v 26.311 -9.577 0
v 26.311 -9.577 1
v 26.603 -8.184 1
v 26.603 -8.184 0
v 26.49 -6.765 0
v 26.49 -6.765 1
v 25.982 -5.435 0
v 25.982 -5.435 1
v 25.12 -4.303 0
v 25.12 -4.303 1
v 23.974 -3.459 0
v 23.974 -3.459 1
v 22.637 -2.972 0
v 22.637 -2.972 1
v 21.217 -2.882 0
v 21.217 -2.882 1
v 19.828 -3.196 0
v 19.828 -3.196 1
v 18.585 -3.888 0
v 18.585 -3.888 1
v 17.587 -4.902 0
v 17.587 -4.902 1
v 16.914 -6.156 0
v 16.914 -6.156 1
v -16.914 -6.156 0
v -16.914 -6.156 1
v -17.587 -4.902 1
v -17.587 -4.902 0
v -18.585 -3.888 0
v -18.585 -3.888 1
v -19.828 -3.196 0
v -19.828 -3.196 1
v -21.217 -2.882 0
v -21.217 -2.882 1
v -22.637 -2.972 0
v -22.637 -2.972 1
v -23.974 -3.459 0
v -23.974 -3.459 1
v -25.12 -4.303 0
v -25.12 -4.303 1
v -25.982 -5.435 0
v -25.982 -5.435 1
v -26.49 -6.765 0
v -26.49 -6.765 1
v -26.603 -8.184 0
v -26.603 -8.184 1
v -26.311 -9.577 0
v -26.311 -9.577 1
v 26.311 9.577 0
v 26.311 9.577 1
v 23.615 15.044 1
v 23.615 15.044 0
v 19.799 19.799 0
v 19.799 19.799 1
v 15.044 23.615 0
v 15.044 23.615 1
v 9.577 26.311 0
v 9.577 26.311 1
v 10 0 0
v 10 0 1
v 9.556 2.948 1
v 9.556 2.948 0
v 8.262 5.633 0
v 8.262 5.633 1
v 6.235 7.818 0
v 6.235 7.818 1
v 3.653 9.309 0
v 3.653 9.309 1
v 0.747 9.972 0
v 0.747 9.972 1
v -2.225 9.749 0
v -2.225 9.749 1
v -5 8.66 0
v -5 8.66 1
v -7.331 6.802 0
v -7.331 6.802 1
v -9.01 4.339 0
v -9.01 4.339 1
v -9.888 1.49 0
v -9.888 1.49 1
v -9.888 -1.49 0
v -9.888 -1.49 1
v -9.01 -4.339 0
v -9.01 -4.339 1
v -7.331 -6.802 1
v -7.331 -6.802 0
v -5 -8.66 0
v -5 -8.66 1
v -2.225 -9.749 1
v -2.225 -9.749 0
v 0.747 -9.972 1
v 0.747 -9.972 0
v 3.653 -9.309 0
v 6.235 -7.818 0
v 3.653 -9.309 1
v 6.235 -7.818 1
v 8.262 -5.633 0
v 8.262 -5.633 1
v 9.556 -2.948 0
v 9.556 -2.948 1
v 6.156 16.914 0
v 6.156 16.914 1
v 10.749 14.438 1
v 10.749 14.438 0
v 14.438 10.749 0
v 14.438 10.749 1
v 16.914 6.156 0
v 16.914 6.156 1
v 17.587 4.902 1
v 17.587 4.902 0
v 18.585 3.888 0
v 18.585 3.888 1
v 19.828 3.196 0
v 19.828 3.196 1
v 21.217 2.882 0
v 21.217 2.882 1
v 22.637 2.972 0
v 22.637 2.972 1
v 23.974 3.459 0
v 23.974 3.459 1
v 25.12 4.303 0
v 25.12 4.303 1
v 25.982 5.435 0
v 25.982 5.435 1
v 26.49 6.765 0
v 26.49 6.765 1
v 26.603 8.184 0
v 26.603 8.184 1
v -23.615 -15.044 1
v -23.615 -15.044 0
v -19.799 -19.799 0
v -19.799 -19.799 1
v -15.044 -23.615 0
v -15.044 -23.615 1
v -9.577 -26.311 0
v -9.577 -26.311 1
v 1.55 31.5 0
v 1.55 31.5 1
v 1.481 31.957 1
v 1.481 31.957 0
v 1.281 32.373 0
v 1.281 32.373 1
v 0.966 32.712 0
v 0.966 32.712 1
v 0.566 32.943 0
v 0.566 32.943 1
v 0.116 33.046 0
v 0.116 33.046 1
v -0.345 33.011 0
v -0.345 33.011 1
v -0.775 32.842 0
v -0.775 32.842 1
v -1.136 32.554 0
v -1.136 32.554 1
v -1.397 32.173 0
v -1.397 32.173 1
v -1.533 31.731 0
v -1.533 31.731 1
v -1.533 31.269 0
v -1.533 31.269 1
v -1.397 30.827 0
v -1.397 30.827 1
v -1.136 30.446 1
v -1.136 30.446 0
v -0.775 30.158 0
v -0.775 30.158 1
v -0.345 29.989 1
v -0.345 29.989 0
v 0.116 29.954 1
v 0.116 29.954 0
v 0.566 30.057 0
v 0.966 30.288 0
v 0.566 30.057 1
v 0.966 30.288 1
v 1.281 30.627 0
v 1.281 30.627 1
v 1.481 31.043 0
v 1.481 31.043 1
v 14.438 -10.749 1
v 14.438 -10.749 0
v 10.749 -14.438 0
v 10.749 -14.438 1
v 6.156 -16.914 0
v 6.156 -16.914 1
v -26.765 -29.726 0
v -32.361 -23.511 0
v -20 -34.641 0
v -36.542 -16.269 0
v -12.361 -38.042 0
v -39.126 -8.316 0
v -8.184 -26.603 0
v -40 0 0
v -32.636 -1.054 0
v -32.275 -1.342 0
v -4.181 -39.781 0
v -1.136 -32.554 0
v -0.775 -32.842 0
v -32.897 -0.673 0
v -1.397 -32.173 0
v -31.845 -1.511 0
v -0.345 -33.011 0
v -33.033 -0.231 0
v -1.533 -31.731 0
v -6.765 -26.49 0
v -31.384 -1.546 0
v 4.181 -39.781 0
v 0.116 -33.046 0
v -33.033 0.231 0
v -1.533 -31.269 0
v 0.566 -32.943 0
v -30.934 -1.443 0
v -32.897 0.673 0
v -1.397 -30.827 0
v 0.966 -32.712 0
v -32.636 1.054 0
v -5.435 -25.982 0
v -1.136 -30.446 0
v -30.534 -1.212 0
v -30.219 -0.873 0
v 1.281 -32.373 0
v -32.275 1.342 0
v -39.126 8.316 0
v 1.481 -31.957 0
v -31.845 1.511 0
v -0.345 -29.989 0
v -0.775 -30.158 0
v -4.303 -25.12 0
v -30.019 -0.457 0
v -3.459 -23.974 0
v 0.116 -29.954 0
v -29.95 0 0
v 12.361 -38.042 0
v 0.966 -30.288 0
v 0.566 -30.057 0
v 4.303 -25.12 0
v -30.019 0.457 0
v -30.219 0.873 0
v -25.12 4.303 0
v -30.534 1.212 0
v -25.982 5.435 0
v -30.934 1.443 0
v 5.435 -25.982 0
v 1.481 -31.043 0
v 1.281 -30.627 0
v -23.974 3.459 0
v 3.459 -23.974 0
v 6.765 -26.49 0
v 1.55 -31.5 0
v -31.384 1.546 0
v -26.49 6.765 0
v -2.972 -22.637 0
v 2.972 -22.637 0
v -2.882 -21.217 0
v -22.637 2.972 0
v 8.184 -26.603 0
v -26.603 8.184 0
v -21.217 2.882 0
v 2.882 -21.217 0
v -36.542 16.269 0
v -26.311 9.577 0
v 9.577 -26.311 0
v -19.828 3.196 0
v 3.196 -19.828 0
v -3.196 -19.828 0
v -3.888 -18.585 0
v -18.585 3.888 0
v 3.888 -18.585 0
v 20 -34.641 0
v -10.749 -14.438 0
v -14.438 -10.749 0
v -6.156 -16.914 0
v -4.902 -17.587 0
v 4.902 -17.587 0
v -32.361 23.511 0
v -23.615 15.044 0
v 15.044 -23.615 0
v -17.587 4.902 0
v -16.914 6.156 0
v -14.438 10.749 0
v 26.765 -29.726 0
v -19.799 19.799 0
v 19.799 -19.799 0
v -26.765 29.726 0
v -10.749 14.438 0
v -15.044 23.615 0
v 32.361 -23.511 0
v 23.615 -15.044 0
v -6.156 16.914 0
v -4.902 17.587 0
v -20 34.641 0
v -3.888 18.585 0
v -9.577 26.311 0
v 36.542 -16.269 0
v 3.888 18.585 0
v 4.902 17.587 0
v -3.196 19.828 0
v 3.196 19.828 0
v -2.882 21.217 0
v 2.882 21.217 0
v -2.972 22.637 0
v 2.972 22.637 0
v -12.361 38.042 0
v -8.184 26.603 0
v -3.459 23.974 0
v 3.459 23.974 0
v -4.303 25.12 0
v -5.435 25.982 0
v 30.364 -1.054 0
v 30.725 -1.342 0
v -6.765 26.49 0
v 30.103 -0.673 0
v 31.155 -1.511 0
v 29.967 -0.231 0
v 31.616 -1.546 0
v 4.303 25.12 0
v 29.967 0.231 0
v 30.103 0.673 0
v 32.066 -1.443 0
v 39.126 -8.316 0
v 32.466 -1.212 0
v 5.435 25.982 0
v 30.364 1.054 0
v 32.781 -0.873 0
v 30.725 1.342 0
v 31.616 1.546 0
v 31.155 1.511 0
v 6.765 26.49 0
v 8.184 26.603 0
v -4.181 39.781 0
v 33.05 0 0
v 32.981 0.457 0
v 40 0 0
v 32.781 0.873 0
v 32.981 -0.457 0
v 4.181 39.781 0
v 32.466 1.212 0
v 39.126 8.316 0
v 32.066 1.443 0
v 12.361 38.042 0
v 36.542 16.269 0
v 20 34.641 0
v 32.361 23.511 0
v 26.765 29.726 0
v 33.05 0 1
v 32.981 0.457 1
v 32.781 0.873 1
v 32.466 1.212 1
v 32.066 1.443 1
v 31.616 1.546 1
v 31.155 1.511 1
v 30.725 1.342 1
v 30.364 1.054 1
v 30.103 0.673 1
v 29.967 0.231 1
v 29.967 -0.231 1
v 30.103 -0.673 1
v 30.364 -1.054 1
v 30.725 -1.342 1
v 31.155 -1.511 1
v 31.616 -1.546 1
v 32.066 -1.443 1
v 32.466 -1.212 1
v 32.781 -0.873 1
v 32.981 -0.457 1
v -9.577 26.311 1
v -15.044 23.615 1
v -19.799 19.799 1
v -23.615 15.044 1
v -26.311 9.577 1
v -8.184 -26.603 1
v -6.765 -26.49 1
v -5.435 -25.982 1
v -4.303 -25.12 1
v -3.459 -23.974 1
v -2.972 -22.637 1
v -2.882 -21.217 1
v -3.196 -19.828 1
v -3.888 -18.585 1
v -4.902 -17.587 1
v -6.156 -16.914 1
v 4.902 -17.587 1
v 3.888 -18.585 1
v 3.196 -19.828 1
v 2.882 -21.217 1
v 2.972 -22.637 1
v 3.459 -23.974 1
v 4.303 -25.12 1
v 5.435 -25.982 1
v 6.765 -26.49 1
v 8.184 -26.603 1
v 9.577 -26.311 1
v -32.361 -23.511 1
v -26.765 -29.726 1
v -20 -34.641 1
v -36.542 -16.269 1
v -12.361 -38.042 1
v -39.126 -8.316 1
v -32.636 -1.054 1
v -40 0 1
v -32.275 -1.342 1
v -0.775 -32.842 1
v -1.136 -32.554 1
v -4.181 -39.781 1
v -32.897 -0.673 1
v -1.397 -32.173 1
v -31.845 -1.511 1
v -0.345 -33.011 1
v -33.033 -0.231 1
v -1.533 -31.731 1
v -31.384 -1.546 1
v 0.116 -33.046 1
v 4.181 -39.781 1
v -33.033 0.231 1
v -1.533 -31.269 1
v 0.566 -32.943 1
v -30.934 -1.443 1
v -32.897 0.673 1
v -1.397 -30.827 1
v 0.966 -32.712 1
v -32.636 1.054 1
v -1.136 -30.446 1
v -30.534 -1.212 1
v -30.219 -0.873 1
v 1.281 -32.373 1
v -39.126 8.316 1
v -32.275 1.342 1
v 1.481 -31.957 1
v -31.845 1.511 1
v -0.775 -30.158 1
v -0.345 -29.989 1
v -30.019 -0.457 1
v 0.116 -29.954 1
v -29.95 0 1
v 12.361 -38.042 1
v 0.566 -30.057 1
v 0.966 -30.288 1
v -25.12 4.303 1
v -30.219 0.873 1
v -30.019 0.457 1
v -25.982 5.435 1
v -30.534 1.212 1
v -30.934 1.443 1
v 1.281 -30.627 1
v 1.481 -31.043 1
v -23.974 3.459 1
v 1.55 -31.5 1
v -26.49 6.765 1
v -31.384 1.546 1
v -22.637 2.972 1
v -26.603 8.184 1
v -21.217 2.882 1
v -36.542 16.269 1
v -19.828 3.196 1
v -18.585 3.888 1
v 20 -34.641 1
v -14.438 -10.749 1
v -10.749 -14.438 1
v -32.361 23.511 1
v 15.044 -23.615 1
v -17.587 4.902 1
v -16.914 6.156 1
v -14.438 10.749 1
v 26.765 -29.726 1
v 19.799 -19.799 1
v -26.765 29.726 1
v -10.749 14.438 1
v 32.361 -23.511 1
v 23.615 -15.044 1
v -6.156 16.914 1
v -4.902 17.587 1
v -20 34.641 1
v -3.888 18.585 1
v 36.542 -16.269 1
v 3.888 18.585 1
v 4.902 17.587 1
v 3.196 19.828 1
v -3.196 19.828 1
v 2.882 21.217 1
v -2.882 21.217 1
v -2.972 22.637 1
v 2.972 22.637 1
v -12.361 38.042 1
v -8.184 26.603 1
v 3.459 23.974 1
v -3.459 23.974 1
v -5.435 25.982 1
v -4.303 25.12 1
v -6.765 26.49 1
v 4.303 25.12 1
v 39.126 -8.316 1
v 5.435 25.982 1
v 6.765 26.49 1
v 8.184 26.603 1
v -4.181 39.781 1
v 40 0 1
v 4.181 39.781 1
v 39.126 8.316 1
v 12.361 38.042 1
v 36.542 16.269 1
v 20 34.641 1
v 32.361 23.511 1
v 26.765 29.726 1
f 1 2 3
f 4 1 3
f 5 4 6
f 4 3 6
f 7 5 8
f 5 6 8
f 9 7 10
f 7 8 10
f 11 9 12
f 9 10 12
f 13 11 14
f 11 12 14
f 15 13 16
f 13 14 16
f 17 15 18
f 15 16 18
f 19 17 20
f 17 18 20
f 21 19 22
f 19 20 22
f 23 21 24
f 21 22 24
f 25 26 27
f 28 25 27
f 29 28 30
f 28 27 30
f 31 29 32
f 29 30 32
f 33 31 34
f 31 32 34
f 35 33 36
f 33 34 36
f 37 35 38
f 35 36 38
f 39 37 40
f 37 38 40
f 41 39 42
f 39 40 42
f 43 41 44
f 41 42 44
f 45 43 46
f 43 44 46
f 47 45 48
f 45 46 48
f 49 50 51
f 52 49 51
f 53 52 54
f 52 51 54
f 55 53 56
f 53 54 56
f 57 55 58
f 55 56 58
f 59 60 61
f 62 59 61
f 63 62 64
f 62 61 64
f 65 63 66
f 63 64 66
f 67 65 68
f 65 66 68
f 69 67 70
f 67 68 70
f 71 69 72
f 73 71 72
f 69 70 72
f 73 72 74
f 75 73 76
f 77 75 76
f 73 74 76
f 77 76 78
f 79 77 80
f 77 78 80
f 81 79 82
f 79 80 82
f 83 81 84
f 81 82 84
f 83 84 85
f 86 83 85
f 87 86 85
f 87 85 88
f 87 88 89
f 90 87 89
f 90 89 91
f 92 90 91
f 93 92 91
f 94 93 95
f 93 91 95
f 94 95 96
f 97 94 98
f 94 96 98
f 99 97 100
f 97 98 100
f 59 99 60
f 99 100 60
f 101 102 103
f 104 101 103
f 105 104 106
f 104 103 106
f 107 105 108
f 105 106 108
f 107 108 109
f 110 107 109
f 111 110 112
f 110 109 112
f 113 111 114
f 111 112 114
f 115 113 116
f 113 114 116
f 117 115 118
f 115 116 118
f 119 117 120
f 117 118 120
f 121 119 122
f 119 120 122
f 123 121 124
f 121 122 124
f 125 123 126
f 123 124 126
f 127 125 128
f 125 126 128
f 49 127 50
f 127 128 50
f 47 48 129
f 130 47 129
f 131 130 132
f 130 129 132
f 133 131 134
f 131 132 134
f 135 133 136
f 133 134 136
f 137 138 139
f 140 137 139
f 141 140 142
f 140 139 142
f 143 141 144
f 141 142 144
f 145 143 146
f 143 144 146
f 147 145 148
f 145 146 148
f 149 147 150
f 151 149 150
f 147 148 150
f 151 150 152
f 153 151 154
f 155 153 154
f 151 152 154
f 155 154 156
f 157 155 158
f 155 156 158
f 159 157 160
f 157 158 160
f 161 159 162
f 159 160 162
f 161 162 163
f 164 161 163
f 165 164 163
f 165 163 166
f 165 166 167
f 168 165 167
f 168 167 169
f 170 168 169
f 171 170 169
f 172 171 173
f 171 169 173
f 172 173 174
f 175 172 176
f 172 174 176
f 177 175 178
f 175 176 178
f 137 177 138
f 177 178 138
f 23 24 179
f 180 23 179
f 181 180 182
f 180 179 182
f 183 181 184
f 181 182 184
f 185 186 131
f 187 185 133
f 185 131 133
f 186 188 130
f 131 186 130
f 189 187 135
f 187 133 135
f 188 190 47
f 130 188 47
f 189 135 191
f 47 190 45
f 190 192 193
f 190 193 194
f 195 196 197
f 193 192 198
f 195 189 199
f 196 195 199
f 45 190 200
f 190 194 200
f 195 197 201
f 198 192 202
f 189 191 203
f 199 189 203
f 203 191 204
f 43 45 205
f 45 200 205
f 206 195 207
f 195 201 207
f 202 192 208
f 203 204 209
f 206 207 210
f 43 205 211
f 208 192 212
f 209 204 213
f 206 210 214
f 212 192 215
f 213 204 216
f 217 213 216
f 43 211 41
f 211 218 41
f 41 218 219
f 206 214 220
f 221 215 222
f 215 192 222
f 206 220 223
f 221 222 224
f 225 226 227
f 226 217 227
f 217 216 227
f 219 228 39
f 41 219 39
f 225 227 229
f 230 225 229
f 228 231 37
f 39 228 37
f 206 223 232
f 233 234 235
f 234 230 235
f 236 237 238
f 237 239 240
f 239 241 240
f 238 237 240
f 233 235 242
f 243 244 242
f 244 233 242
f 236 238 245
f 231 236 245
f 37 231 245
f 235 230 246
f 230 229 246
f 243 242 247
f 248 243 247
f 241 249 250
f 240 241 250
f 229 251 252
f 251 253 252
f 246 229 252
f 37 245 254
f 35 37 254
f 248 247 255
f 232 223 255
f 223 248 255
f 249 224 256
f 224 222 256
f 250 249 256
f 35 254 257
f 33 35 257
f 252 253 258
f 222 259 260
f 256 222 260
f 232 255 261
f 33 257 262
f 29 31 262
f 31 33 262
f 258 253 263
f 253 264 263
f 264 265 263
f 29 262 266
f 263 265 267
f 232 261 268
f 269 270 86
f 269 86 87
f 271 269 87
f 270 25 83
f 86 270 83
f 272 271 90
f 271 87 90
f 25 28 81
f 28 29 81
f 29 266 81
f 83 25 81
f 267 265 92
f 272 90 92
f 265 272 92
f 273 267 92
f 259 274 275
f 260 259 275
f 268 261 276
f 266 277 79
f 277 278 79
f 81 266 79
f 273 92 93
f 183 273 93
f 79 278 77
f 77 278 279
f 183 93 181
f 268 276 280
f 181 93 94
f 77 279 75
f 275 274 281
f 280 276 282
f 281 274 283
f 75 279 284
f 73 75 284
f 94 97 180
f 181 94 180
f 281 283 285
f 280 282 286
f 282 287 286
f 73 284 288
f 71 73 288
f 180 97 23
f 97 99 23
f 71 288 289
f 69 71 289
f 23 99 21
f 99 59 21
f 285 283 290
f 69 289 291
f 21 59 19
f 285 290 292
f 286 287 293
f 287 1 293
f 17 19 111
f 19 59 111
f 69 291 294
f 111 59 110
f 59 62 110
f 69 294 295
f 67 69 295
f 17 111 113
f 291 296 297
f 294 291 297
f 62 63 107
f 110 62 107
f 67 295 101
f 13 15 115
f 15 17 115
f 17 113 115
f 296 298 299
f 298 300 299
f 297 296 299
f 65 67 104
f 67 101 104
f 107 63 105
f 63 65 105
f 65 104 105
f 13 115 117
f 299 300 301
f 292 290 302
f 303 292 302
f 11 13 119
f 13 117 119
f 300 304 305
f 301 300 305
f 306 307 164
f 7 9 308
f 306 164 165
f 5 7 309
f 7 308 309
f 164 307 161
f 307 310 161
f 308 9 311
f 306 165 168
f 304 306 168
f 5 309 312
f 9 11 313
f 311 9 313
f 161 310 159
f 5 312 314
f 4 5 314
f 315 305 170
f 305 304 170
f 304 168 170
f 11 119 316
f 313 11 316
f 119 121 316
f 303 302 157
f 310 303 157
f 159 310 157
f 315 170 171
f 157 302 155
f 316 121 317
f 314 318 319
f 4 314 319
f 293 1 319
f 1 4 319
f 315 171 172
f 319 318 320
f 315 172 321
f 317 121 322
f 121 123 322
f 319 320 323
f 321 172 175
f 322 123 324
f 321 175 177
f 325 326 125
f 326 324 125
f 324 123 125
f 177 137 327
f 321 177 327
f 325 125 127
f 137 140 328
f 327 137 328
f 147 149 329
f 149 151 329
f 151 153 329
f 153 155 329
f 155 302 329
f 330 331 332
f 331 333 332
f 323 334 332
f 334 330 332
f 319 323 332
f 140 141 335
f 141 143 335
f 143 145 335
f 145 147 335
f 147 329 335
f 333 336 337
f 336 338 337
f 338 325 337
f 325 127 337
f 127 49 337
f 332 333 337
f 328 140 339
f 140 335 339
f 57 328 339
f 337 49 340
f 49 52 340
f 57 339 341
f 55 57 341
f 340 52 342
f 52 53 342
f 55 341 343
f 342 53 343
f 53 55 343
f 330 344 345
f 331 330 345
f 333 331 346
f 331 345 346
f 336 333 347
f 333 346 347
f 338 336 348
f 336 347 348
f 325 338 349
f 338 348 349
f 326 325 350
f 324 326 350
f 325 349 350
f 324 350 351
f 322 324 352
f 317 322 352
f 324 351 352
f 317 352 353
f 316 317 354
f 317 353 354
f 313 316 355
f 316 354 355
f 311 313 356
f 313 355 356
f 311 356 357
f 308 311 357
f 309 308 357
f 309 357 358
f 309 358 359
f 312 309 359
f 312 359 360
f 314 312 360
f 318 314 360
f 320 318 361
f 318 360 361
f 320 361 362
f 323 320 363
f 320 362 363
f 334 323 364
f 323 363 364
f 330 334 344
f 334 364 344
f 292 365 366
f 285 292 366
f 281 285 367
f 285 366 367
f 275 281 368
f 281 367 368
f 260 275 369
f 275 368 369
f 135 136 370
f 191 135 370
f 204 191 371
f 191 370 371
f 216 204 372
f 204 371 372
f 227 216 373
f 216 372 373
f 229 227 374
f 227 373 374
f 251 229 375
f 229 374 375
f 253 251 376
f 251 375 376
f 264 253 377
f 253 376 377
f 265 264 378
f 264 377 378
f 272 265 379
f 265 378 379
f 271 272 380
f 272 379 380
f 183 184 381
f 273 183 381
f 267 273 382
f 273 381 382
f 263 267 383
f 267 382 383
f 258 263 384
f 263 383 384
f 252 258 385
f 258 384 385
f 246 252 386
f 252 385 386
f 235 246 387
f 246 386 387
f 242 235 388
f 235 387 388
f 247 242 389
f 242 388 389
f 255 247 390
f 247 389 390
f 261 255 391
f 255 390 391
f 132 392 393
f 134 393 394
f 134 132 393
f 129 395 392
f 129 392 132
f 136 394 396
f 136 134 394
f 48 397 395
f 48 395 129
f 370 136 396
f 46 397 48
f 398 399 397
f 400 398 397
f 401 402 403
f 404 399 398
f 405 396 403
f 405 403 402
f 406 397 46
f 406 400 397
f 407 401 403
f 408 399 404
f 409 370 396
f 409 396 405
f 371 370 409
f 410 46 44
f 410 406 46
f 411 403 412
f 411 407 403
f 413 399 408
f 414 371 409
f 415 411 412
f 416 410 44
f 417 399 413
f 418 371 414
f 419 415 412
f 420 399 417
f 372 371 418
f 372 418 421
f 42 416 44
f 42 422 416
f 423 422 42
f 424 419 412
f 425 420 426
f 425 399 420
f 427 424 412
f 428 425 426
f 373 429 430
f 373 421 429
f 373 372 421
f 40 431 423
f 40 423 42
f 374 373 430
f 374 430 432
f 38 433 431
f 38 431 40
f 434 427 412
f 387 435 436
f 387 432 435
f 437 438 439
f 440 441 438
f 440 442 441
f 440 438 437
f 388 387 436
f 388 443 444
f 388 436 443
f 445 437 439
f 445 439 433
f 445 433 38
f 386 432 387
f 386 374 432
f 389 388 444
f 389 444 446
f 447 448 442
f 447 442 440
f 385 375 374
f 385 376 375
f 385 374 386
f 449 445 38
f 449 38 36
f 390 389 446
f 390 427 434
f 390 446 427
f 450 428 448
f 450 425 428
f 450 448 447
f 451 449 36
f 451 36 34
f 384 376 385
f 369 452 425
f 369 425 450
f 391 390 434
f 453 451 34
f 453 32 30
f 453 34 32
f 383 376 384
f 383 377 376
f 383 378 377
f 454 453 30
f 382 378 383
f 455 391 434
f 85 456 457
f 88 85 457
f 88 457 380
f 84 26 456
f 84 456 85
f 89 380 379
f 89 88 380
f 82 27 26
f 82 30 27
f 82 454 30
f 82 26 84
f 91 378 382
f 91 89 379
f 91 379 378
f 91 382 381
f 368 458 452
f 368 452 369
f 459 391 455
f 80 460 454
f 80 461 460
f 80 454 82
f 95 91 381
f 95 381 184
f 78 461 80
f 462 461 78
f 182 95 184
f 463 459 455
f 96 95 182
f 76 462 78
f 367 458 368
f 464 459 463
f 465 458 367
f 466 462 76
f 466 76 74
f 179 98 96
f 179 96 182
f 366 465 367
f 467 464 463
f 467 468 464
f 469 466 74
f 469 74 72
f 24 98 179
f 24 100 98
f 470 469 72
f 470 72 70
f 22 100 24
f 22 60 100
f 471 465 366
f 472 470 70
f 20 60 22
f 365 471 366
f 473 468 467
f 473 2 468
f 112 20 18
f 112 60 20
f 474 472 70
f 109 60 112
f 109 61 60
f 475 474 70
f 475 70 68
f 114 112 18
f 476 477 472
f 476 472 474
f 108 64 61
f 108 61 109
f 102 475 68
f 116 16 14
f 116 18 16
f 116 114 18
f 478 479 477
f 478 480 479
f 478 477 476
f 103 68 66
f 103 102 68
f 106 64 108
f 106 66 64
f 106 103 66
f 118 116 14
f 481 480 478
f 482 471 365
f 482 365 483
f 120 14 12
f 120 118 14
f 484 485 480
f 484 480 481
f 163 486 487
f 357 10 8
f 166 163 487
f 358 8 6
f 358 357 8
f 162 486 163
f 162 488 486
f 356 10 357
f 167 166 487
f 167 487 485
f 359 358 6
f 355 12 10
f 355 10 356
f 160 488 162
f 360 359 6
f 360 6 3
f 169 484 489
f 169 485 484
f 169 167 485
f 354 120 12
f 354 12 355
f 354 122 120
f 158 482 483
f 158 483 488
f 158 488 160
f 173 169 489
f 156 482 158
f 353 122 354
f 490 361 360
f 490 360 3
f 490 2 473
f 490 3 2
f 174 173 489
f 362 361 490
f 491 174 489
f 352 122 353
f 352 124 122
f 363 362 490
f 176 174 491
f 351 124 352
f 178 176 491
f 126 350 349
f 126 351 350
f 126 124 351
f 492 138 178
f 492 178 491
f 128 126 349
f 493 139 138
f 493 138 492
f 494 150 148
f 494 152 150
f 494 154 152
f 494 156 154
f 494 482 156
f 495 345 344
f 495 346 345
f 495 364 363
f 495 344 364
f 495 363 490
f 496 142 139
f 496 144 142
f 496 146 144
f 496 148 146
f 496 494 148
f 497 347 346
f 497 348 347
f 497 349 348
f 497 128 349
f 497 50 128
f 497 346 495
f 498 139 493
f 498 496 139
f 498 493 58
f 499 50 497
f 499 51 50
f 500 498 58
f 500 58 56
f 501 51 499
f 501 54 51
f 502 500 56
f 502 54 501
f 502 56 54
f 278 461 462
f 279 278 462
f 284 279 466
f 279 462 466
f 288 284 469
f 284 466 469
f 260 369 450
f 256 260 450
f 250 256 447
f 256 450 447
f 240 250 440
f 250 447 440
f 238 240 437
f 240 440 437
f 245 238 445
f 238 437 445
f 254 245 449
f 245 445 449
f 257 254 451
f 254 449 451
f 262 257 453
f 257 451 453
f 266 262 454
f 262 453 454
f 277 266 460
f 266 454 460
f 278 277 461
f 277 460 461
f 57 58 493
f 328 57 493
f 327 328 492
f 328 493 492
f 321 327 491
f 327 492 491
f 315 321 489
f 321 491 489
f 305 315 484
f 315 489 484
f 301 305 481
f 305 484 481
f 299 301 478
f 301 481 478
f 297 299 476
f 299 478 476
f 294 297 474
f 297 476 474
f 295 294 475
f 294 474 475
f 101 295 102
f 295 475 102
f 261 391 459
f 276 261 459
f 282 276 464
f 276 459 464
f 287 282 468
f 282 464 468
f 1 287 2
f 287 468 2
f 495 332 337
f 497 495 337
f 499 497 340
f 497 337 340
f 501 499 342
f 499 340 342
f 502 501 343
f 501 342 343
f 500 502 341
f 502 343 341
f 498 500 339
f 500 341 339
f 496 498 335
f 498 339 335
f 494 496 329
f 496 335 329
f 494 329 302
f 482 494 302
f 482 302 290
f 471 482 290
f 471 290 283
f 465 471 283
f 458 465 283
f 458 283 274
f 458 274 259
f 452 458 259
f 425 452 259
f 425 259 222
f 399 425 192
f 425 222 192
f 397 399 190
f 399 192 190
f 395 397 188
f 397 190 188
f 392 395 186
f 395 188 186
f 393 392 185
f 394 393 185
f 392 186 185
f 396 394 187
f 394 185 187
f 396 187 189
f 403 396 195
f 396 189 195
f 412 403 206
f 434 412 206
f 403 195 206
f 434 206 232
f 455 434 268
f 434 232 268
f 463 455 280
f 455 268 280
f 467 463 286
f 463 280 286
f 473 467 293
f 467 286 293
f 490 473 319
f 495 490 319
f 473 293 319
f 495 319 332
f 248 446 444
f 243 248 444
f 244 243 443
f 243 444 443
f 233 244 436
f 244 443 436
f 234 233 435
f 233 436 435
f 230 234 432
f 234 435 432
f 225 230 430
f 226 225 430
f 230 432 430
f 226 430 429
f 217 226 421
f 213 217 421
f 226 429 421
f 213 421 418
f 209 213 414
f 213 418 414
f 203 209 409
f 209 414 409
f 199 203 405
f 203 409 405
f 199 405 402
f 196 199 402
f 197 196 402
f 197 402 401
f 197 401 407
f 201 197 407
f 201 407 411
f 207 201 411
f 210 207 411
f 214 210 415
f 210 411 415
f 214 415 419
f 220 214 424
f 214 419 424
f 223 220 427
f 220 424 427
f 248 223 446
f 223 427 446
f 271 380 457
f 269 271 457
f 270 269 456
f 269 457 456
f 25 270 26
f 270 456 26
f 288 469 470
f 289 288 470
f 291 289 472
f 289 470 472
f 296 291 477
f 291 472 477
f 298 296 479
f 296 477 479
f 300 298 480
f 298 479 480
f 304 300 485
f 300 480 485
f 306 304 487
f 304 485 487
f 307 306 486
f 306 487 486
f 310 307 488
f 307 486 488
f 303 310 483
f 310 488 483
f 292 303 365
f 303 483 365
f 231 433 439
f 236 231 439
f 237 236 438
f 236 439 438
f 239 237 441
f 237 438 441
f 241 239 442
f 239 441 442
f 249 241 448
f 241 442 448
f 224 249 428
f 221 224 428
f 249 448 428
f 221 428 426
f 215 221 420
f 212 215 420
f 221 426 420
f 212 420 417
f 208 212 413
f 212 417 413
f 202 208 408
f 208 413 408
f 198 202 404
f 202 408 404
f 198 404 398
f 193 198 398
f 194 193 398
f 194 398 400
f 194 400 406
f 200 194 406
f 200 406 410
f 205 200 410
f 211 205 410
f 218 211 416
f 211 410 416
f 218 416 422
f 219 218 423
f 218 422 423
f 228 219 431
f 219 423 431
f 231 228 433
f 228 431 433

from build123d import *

# Parameters (mm, degrees)
SKETCH_1_R               = 40
EXTRUDE_1_DEPTH          = 1
SKETCH_2_R               = 1.55
CUT_EXTRUDE_1_DEPTH      = 1
SKETCH_4_R               = 10
CUT_EXTRUDE_3_DEPTH      = 1
CUT_EXTRUDE_4_DEPTH      = 1
PATTERN_CIRCULAR_2_COUNT = 4


with BuildPart() as part:
    # 草图1 → 凸台-拉伸1 (new body)
    with BuildSketch(Plane.XY):
        Circle(SKETCH_1_R)
    extrude(amount=EXTRUDE_1_DEPTH)

    # 草图2 → 切除-拉伸1 (cut)
    with BuildSketch(Plane.XY.offset(1)):
        with Locations((0, 31.5)):
            Circle(SKETCH_2_R)
        with Locations((-31.5, 0)):
            Circle(SKETCH_2_R)
        with Locations((0, -31.5)):
            Circle(SKETCH_2_R)
        with Locations((31.5, 0)):
            Circle(SKETCH_2_R)
    extrude(amount=-CUT_EXTRUDE_1_DEPTH, mode=Mode.SUBTRACT)

    # 草图4 → 切除-拉伸3 (cut)
    with BuildSketch(Plane.XY.offset(1)):
        Circle(SKETCH_4_R)
    extrude(amount=-CUT_EXTRUDE_3_DEPTH, mode=Mode.SUBTRACT)

    # 草图5 → 切除-拉伸4 (cut)
    with BuildSketch(Plane.XY.offset(1)):
        with BuildLine():
            ThreePointArc((9.576564013, -26.311393382), (19.798989873, -19.798989873), (26.311393382, -9.576564013))
            ThreePointArc((26.311393382, -9.576564013), (23.323030995, -3.168000193), (16.914467174, -6.15636258))
            ThreePointArc((16.914467174, -6.15636258), (12.727922061, -12.727922061), (6.15636258, -16.914467174))
            ThreePointArc((6.15636258, -16.914467174), (3.168000193, -23.323030995), (9.576564013, -26.311393382))
        make_face()
    cut_extrude_4 = extrude(amount=-CUT_EXTRUDE_4_DEPTH, mode=Mode.SUBTRACT)

    # 阵列(圆周)2: 切除-拉伸4 ×4 about axis
    pattern_circular_2_axis = Axis((0, 0, 0), (0, 0, 1))
    for i in range(1, PATTERN_CIRCULAR_2_COUNT):
        add(cut_extrude_4.rotate(pattern_circular_2_axis, i * 360 / PATTERN_CIRCULAR_2_COUNT), mode=Mode.SUBTRACT)


solid = part.part
